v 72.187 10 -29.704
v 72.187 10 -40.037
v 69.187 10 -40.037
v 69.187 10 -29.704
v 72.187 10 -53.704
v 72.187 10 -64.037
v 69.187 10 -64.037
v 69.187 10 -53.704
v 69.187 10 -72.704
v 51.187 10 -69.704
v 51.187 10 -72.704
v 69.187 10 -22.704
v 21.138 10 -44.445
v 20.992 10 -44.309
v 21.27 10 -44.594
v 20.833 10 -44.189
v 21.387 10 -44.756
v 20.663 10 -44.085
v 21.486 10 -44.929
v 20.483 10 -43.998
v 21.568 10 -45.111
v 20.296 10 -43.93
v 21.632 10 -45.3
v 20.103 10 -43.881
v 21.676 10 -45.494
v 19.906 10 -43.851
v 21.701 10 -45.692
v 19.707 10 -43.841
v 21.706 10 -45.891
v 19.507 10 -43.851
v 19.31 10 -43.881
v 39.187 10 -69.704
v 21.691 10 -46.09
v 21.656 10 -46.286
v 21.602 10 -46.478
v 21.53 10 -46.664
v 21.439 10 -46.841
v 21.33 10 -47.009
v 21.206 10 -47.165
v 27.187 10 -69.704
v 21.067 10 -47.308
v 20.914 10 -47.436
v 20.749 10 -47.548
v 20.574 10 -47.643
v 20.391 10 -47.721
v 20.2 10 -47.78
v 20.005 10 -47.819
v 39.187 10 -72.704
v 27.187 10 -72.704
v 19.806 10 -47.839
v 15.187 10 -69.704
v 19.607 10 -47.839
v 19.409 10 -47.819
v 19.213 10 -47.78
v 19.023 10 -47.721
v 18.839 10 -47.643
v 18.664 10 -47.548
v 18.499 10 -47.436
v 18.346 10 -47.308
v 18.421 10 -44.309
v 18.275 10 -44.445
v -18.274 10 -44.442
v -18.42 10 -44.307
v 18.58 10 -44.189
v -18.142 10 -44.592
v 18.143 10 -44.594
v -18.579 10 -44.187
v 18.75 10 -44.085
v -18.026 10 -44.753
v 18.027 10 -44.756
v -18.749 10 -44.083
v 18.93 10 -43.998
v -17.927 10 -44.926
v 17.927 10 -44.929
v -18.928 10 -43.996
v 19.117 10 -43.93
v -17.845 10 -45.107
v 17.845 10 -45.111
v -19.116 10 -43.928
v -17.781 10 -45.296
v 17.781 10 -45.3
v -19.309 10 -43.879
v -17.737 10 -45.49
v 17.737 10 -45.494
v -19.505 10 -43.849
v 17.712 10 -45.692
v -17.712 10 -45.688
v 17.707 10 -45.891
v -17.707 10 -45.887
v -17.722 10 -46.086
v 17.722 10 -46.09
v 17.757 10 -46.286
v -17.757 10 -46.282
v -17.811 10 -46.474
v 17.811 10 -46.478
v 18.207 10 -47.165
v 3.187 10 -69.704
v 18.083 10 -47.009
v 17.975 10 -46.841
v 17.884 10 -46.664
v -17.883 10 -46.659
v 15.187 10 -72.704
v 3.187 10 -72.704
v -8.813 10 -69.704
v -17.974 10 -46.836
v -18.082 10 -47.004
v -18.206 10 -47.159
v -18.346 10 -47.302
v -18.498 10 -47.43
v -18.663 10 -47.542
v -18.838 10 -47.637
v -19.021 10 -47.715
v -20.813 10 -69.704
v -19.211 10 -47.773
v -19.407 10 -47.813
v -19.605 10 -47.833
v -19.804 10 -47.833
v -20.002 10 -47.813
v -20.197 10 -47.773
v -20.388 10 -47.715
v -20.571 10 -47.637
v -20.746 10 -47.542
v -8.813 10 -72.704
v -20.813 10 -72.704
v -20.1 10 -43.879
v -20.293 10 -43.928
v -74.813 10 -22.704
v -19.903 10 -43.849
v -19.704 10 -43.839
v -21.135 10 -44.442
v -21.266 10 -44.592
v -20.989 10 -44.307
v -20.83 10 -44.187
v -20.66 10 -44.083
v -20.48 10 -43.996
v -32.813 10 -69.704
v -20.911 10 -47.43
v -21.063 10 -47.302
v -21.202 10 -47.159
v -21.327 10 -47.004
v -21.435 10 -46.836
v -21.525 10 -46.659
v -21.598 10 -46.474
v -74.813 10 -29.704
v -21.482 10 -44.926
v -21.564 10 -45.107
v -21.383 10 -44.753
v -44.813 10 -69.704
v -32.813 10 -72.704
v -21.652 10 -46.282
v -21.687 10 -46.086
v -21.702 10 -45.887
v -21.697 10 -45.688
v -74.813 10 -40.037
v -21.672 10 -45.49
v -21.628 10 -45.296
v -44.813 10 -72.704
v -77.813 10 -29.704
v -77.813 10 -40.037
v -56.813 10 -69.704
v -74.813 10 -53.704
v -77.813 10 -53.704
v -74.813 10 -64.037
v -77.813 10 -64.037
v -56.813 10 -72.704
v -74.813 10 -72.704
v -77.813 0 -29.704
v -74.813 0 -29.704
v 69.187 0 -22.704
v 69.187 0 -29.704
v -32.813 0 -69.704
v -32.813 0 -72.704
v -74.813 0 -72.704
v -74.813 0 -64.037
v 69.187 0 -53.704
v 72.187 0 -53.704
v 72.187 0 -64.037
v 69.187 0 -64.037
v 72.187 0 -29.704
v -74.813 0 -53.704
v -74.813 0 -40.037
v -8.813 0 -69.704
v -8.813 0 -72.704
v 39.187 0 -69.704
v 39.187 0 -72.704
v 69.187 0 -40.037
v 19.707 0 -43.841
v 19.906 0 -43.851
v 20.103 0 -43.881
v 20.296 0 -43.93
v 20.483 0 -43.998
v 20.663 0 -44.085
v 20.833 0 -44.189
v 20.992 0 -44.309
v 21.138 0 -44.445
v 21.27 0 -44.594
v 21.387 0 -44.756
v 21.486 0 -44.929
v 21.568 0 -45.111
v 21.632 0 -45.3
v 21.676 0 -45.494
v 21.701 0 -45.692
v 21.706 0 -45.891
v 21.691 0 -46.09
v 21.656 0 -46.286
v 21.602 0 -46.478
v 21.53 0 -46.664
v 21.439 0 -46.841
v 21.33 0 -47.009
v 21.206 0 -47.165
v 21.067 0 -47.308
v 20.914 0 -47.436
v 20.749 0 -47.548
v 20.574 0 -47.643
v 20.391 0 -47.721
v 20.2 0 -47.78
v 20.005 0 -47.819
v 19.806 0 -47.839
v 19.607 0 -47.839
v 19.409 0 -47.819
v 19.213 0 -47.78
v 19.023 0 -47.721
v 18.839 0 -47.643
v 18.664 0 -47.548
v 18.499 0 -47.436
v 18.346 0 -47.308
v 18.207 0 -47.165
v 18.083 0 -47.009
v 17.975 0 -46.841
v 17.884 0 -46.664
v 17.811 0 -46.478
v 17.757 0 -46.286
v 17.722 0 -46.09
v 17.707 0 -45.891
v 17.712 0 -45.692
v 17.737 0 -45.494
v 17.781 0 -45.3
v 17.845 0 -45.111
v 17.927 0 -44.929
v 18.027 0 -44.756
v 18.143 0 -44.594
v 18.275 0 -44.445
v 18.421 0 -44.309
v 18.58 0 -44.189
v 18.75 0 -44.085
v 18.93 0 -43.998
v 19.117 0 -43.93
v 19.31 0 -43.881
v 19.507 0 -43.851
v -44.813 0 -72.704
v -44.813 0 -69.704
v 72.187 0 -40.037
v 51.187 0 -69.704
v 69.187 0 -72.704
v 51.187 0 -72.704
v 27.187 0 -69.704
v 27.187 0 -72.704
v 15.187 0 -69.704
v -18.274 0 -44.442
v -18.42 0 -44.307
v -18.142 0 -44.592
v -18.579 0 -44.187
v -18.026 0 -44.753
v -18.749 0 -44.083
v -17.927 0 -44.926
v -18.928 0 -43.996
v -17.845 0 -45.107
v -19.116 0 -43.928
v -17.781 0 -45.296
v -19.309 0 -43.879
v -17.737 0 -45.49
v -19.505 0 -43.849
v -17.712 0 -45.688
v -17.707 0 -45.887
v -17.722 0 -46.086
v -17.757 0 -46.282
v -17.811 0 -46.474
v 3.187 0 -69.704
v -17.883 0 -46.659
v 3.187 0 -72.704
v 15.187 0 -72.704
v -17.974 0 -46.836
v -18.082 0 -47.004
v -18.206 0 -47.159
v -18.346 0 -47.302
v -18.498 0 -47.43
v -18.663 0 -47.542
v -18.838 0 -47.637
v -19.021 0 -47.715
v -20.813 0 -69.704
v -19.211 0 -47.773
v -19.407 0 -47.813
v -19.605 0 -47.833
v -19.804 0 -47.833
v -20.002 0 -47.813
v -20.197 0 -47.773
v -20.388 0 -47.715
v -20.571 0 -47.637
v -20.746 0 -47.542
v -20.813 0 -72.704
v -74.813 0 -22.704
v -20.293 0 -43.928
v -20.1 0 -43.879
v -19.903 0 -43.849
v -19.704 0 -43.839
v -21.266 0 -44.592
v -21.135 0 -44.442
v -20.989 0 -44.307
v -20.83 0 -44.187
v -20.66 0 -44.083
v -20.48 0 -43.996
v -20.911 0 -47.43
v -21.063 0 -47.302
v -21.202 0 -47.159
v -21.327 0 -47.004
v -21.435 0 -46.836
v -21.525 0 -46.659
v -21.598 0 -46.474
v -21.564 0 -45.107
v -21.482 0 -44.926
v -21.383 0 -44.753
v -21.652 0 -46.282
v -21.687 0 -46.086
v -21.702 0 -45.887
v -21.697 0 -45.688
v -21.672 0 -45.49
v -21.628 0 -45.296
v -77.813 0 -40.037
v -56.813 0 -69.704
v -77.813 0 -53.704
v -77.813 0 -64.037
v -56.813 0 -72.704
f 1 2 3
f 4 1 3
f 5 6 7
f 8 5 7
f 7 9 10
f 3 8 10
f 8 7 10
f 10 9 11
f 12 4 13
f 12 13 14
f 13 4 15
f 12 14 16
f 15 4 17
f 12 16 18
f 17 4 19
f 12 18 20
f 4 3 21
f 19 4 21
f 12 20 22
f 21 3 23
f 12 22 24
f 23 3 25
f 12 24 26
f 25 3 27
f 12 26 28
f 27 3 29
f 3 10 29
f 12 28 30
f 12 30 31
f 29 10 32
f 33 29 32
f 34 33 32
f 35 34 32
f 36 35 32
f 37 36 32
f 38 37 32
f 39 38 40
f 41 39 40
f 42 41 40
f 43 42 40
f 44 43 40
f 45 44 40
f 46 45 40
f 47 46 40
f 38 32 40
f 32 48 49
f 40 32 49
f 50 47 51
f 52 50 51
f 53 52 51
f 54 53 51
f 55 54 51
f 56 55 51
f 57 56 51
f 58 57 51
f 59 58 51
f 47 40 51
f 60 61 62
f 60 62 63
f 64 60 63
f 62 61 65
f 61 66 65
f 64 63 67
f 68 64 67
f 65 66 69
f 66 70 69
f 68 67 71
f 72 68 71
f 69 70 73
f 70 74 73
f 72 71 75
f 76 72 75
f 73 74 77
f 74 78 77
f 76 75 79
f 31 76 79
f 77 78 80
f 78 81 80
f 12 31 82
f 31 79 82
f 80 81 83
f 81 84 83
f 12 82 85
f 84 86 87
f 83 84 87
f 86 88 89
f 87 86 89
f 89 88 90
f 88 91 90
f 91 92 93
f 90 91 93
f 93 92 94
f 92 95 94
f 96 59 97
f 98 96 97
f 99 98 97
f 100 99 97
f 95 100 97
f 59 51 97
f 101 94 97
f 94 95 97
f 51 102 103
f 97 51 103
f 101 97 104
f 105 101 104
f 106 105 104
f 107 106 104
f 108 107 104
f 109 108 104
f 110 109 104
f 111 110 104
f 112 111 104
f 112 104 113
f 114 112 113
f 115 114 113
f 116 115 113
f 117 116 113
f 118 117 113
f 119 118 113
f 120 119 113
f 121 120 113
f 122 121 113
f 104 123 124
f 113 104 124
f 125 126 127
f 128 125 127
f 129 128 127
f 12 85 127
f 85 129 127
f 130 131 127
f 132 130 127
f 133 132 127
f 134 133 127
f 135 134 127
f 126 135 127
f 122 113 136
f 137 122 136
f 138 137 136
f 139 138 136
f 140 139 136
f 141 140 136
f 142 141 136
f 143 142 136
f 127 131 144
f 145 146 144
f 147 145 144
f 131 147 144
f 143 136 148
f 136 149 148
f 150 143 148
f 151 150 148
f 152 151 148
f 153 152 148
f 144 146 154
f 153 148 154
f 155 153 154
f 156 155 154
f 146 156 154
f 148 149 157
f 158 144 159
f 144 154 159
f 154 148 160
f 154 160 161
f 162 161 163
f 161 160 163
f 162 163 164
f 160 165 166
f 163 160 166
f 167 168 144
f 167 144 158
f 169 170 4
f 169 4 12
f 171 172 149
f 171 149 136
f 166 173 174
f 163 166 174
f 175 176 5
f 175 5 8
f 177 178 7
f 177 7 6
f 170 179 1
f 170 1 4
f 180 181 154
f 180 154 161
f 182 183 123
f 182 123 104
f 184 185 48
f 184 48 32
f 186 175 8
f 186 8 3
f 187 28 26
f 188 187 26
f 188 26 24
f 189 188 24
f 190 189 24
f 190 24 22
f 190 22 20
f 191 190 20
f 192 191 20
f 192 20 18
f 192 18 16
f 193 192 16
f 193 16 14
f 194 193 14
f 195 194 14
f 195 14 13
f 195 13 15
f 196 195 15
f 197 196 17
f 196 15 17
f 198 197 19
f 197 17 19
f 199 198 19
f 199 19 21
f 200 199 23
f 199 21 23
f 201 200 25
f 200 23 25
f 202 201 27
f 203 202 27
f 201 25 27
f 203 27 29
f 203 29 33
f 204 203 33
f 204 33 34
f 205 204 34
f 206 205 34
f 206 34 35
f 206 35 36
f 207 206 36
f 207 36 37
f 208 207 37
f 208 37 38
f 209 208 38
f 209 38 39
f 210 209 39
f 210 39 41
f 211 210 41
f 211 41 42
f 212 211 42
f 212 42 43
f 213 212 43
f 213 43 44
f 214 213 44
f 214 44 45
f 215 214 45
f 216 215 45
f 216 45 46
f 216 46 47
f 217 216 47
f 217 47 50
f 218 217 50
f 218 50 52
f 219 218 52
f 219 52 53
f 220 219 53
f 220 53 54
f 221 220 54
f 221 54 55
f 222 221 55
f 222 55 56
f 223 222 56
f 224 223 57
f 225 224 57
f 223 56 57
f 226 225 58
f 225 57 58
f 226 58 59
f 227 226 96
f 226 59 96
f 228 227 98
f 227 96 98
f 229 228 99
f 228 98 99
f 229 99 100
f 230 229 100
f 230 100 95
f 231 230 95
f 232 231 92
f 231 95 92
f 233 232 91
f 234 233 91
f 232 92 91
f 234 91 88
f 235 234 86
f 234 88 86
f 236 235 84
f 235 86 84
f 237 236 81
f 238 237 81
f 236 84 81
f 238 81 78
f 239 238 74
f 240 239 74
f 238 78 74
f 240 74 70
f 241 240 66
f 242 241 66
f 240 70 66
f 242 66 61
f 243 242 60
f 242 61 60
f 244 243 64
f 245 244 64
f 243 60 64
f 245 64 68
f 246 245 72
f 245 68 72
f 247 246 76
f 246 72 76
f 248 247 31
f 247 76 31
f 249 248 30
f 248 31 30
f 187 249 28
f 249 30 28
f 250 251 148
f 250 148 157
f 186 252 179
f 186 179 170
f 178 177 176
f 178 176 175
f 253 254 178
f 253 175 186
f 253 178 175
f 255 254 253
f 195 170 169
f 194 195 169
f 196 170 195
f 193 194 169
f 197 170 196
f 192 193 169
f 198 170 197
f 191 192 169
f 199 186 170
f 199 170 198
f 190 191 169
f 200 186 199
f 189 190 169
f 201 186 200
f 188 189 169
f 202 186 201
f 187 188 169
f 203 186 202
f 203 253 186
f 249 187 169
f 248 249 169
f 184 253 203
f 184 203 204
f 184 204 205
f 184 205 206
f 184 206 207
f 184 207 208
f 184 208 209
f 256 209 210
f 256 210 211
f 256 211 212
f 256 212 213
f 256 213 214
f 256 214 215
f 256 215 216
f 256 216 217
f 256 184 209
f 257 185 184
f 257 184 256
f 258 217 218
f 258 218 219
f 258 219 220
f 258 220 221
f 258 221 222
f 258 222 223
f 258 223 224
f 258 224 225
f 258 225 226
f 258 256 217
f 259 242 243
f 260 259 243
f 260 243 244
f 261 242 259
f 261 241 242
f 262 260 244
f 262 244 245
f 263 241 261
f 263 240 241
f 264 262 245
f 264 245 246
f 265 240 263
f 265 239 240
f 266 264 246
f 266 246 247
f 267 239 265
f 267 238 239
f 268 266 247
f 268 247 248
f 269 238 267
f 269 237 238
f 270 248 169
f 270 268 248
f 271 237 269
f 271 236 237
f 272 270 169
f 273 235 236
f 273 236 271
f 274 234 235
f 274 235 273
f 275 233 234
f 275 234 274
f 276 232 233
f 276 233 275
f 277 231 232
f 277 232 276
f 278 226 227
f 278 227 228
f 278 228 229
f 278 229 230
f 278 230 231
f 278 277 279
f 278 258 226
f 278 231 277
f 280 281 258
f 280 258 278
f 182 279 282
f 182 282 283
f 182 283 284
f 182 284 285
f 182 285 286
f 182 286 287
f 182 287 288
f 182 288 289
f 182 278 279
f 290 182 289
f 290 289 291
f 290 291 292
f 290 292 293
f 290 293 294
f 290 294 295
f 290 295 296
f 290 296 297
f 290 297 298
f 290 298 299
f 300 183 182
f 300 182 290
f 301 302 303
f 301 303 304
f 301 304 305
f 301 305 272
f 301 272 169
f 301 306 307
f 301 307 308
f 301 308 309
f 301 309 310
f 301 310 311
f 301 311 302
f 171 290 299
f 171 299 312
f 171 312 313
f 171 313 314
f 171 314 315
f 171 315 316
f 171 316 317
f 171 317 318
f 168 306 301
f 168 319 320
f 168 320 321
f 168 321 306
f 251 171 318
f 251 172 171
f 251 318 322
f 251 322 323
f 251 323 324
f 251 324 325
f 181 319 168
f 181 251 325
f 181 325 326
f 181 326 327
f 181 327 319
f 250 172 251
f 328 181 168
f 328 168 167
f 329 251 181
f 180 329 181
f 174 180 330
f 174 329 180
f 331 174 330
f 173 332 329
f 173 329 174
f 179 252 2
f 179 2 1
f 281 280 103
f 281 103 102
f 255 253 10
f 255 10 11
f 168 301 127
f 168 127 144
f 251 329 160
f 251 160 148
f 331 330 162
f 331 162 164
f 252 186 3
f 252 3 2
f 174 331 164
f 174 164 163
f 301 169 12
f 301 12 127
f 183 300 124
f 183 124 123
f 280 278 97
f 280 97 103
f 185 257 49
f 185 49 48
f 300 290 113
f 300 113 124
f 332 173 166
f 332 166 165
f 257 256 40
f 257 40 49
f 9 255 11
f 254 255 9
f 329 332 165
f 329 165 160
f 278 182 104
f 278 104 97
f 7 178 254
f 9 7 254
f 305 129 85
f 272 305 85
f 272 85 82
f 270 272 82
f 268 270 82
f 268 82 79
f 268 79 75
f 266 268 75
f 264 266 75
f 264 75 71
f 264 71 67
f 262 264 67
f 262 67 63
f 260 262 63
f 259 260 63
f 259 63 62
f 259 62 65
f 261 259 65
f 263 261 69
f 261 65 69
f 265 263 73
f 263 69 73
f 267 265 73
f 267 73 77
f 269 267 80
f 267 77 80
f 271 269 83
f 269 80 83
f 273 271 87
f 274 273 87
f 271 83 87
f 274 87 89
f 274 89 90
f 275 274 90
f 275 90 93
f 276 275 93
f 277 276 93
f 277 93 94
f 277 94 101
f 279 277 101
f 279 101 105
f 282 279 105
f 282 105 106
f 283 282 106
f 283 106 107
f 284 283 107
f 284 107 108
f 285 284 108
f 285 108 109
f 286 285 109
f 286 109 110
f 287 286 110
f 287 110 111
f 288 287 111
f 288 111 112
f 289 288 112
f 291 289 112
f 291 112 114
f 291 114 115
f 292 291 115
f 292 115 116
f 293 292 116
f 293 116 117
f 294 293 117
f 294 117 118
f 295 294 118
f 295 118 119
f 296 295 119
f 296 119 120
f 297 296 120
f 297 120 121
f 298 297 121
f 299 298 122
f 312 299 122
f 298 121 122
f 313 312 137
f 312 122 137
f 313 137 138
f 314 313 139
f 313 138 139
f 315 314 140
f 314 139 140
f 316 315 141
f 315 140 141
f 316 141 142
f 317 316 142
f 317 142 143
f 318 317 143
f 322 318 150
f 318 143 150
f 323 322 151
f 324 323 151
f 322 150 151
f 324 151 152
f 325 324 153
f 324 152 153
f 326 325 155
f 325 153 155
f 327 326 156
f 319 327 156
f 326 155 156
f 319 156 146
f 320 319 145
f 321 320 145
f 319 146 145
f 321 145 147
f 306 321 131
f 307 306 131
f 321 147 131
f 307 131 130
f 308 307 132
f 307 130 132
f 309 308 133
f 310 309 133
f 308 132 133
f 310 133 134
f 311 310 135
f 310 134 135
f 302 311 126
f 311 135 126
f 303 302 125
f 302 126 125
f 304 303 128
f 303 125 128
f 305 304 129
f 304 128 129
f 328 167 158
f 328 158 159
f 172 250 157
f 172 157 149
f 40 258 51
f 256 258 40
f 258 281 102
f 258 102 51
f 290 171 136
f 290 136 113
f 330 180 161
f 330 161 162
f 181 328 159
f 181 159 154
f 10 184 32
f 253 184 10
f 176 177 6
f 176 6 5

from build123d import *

# Parameters (mm, degrees)
BOSS_EXTRUDE1_DEPTH = 10
SKETCH2_R           = 1.997822351
SKETCH2_R_2         = 2.000000328
CUT_EXTRUDE1_DEPTH  = 107.961093012


with BuildPart() as part:
    # Sketch1 → Boss-Extrude1 (new body)
    with BuildSketch(Plane(origin=(0, 0, 0), x_dir=(1, 0, 0), z_dir=(0, 1, 0))):
        Polygon((-32.812912017, 69.703683257), (-20.812911913, 69.703683257), (-20.812911913, 72.703689337), (-8.812911808, 72.703689337), (-8.812911808, 69.703683257), (3.187088063, 69.703683257), (3.187088063, 72.703689337), (15.1870884, 72.703689337), (15.1870884, 69.703683257), (27.187088504, 69.703683257), (27.187088504, 72.703689337), (39.187088609, 72.703689337), (39.187088609, 69.703683257), (51.18708685, 69.703683257), (51.18708685, 72.703689337), (69.187089801, 72.703689337), (69.187089801, 69.703683257), (69.187089801, 64.03671205), (72.18708843, 64.03671205), (72.18708843, 53.703688085), (69.187089801, 53.703688085), (69.187089801, 40.036708117), (72.18708843, 40.036708117), (72.18708843, 29.703684151), (69.187089801, 29.703684151), (69.187089801, 22.703684866), (-74.812911451, 22.703684866), (-74.812911451, 29.703684151), (-77.81291008, 29.703684151), (-77.81291008, 40.036708117), (-74.812911451, 40.036708117), (-74.812911451, 53.703688085), (-77.81291008, 53.703688085), (-77.81291008, 64.03671205), (-74.812911451, 64.03671205), (-74.812911451, 69.703683257), (-74.812911451, 72.703689337), (-56.812912226, 72.703689337), (-56.812912226, 69.703683257), (-44.812910259, 69.703683257), (-44.812910259, 72.703689337), (-32.812912017, 72.703689337), align=None)
    extrude(amount=BOSS_EXTRUDE1_DEPTH)

    # Sketch2 → Cut-Extrude1 (cut, through all)
    with BuildSketch(Plane(origin=(0, 10, 0), x_dir=(1, 0, 0), z_dir=(0, 1, 0))):
        with Locations(Location((-19.704415408, 45.837319398, 0), (0, 0, 270))):
            Circle(SKETCH2_R)
        with Locations(Location((19.706618041, 45.84139958, 0), (0, 0, 270))):
            Circle(SKETCH2_R_2)
    extrude(amount=-CUT_EXTRUDE1_DEPTH, mode=Mode.SUBTRACT)


solid = part.part
